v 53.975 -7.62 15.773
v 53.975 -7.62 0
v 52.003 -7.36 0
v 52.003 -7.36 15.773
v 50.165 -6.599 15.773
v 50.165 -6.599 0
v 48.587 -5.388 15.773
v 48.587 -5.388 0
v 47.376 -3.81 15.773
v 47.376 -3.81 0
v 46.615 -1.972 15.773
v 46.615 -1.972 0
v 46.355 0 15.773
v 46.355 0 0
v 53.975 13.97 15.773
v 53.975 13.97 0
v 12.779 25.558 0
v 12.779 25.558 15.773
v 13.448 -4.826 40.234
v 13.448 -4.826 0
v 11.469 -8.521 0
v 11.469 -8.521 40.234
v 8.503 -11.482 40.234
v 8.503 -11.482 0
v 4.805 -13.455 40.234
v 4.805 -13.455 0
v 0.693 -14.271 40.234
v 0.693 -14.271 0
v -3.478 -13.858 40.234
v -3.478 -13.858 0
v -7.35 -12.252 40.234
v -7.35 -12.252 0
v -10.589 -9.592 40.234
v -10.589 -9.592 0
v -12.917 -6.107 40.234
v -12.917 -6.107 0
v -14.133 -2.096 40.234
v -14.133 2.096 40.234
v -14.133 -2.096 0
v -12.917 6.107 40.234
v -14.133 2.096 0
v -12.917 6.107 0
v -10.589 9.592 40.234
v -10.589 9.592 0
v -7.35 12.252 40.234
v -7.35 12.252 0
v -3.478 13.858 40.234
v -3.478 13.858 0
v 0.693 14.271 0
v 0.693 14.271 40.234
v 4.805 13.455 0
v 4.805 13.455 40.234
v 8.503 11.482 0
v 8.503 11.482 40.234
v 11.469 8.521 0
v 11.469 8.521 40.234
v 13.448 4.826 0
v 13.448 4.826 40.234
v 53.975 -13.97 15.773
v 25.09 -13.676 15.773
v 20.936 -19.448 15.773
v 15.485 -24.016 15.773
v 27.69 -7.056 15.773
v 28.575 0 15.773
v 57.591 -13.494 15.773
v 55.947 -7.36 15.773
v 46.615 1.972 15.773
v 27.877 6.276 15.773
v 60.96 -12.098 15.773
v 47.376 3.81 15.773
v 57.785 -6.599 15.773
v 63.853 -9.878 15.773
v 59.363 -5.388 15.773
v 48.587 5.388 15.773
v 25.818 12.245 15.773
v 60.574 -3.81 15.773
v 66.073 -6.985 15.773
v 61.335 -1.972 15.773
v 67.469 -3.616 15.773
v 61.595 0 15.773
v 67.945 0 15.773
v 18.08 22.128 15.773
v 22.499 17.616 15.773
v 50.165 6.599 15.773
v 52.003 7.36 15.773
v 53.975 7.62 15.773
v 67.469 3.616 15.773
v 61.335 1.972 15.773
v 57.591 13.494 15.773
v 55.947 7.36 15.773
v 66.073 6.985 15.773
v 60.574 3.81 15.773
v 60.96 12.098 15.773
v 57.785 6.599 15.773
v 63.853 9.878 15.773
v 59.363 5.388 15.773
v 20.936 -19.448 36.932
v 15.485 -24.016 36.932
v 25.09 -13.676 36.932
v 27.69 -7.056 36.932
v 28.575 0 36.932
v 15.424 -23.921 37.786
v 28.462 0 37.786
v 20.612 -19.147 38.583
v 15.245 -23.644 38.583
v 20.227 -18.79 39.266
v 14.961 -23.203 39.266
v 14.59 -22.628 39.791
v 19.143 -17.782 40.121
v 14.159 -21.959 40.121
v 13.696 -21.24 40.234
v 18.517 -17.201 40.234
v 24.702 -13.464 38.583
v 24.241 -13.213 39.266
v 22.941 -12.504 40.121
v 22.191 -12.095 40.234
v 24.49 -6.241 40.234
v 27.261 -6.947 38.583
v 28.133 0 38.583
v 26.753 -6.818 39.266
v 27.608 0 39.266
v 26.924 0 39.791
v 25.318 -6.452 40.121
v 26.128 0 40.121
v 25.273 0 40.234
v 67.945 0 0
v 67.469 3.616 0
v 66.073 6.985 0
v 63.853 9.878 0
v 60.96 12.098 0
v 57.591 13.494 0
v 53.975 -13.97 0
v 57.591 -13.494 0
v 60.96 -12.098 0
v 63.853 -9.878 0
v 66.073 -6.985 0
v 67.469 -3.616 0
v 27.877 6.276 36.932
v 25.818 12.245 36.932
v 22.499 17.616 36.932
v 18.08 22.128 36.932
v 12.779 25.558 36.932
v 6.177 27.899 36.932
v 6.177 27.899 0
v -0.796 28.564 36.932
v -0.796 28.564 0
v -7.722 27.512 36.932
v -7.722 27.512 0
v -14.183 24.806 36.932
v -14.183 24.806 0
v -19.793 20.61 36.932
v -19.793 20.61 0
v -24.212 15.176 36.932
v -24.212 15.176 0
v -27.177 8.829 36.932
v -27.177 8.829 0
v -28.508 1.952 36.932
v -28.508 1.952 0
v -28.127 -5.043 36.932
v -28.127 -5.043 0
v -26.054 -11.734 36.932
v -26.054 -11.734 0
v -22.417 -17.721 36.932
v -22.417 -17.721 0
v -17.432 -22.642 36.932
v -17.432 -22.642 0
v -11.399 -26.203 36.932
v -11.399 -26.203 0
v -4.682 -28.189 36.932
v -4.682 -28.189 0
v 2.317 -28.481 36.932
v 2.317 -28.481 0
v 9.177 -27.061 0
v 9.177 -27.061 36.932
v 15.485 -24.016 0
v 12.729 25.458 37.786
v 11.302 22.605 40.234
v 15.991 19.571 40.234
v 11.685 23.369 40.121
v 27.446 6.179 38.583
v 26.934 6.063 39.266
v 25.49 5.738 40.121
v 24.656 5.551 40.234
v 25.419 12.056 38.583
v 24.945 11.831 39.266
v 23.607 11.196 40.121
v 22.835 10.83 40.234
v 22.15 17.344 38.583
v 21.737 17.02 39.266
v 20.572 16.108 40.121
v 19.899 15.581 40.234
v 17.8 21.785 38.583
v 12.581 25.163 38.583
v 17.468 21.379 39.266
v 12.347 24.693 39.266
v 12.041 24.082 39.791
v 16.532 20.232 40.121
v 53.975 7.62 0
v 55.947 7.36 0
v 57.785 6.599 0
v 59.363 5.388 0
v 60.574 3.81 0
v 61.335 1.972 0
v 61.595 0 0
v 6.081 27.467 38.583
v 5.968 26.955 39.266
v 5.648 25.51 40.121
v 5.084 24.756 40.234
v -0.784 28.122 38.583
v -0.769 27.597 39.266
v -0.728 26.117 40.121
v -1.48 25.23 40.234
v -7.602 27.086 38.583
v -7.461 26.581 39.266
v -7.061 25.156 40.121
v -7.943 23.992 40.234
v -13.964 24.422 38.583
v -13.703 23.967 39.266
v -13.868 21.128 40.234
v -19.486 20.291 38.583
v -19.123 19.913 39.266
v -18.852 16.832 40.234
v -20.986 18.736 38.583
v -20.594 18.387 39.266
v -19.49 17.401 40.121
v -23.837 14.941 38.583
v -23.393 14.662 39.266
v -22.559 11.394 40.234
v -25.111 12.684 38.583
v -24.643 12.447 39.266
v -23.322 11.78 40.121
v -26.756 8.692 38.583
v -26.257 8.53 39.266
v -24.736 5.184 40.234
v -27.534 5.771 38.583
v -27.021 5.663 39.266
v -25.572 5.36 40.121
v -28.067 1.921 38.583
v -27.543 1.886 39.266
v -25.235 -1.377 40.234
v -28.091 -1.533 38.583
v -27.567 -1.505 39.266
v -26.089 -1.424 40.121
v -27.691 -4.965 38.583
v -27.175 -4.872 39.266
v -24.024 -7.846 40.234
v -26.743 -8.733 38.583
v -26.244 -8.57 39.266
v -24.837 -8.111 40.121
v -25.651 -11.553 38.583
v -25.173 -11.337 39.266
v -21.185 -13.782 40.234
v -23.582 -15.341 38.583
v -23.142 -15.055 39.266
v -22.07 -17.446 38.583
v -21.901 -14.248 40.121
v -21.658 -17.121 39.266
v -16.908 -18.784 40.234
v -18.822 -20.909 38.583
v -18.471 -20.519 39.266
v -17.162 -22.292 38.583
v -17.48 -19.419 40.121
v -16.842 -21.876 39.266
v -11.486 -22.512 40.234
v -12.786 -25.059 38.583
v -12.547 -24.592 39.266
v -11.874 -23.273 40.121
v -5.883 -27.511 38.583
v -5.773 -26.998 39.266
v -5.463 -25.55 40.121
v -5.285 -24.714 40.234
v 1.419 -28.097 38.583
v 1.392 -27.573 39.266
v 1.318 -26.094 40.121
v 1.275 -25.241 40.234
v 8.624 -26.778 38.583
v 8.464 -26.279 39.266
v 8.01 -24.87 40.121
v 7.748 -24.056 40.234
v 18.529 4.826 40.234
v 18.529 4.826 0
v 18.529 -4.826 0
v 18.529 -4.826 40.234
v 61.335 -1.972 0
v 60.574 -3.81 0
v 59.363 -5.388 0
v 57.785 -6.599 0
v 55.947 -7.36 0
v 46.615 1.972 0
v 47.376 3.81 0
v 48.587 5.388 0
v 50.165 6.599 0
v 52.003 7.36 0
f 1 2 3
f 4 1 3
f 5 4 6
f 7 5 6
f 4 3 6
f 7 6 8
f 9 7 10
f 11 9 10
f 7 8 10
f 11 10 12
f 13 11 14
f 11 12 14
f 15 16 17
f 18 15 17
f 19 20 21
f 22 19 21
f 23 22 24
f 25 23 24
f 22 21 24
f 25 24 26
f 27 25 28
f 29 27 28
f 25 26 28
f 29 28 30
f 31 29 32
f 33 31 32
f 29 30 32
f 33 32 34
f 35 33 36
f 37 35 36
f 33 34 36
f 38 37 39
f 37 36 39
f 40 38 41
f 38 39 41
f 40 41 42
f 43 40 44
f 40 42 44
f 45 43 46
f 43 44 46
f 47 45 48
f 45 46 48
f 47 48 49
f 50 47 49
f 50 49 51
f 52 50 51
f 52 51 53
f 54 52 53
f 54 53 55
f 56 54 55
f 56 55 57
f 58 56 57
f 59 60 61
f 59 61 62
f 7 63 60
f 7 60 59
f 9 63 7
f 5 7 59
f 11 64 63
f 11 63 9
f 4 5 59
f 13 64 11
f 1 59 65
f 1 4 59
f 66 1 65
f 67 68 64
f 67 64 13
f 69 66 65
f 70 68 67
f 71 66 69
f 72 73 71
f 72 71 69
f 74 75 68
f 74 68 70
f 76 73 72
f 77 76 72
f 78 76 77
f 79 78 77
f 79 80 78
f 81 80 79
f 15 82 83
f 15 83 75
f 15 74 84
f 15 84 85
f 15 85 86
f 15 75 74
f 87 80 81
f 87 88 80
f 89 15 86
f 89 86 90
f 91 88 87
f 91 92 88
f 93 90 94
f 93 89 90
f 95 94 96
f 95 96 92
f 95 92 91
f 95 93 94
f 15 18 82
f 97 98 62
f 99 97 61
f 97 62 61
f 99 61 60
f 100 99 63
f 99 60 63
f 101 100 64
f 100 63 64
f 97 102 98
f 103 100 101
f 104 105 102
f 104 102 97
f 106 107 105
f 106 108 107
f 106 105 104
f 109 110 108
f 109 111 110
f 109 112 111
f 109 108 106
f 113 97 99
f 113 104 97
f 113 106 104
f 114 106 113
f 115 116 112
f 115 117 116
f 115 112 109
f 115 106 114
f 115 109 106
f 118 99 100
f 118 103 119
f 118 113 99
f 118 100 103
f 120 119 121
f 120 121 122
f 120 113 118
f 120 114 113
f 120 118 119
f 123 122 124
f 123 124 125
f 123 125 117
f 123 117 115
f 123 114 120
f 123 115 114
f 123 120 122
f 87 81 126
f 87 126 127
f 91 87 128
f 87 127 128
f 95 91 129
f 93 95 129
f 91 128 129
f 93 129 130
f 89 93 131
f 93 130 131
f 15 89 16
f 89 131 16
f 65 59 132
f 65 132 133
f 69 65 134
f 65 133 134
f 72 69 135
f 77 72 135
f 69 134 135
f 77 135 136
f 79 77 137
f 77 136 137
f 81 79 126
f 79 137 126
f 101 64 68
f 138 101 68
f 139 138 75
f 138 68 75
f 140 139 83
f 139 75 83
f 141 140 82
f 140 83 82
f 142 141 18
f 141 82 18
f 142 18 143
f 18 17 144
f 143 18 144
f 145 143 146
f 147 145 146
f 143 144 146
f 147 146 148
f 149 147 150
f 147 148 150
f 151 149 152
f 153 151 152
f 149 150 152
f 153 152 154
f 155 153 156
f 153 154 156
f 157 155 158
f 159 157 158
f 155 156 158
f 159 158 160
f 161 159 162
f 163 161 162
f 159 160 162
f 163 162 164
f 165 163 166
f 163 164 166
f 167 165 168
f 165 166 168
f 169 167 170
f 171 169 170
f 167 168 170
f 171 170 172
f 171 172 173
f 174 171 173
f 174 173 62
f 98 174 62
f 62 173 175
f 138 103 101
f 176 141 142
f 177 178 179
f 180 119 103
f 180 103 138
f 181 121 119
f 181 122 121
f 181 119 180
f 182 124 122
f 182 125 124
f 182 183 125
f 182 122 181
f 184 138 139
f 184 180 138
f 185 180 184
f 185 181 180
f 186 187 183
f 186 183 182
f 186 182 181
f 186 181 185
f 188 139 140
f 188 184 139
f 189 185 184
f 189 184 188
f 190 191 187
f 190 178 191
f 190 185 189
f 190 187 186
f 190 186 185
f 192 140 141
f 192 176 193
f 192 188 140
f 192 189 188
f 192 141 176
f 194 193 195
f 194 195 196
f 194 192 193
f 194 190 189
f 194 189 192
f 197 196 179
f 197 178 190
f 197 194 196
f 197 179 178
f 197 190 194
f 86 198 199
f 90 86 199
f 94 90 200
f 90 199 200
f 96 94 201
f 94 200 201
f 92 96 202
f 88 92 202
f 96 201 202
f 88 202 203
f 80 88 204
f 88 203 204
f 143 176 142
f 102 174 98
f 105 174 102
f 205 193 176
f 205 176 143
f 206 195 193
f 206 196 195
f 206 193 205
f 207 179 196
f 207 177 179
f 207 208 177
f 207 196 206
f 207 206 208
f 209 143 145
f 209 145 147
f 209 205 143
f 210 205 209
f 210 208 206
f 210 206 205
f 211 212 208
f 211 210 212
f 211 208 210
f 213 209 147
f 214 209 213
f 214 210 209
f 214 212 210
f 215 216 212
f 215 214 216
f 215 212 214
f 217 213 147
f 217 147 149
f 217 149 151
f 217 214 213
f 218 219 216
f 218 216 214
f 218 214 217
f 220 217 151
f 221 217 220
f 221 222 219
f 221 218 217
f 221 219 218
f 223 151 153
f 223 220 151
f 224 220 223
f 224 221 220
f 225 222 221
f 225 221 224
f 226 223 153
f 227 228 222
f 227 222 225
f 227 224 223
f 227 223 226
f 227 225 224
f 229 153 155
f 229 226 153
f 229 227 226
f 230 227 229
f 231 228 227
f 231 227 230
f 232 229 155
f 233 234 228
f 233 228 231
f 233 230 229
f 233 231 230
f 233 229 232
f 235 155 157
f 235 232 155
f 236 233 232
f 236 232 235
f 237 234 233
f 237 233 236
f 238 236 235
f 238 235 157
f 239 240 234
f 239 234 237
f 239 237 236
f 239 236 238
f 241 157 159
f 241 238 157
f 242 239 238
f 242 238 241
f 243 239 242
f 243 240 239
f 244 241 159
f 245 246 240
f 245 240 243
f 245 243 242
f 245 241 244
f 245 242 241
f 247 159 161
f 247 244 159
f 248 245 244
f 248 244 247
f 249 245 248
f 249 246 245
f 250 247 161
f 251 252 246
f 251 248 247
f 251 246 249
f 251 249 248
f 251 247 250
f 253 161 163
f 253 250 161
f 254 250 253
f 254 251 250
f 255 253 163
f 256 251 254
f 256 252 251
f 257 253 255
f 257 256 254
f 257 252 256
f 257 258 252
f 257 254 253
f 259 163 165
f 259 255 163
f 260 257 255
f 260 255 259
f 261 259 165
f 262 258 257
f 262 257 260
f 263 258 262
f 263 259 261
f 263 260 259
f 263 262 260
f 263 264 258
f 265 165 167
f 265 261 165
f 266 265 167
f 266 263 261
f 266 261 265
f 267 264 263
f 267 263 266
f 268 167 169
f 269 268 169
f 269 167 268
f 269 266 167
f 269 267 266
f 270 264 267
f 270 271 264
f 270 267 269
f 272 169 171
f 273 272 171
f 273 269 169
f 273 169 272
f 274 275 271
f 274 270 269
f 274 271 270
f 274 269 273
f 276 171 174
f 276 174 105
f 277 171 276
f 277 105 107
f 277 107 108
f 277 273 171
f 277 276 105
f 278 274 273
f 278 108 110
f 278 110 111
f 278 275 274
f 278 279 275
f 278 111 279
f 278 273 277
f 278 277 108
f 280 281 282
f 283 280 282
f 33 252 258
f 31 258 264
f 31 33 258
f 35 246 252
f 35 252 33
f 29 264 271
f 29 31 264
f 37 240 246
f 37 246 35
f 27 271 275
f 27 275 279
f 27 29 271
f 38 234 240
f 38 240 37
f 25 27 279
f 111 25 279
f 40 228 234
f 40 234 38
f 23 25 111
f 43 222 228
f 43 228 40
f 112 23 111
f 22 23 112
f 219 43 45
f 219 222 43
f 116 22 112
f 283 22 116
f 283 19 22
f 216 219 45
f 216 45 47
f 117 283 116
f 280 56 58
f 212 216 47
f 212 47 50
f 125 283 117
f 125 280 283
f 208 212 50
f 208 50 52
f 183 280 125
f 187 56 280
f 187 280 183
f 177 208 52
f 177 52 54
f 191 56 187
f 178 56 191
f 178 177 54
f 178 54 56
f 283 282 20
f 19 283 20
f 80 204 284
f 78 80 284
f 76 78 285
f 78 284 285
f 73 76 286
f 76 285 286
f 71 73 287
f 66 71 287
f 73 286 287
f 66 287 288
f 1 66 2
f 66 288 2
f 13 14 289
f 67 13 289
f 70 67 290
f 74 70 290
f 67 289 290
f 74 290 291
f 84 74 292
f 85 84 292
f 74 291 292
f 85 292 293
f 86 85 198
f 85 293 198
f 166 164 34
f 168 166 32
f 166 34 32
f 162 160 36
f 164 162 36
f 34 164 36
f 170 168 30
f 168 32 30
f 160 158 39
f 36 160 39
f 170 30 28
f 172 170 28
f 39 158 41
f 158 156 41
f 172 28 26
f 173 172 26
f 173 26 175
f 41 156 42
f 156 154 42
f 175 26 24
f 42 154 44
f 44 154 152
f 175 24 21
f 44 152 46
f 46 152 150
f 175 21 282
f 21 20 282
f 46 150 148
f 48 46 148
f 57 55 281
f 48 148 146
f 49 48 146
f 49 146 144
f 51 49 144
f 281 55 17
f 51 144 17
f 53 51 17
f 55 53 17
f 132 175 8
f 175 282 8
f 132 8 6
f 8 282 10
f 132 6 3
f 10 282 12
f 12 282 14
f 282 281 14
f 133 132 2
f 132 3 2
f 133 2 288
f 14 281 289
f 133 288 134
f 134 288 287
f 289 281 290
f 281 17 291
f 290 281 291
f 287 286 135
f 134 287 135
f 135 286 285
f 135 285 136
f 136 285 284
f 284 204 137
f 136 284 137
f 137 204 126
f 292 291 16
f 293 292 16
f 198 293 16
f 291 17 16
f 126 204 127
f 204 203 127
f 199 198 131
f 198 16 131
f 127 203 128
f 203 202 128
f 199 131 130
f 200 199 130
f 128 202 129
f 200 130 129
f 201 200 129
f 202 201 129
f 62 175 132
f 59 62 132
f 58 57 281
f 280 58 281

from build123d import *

# Parameters (mm, degrees)
F1_DEPTH = 40.2336
F2_DEPTH = 15.7734
F3_R     = 3.302


with BuildPart() as f1:
    # F0 (on Top) → F1 (new body)
    with BuildSketch(Plane.XY):
        with BuildLine():
            ThreePointArc((15.4849246273, -24.0155727453), (25.0899616005, -13.6756883515), (28.575, 0))
            ThreePointArc((28.575, 0), (24.3073468487, 15.0227665288), (12.7791284914, 25.5582569828))
            ThreePointArc((12.7791284914, 25.5582569828), (-28.532530963, -1.5573380643), (15.4849246273, -24.0155727453))
        make_face()
        with BuildLine():
            Line((18.5293, 4.826), (18.5293, 0))
            Line((18.5293, 0), (18.5293, -4.826))
            Line((18.5293, -4.826), (13.4477648793, -4.826))
            ThreePointArc((13.4477648793, -4.826), (-14.2875, 0), (13.4477648793, 4.826))
            Line((13.4477648793, 4.826), (18.5293, 4.826))
        make_face(mode=Mode.SUBTRACT)
    extrude(amount=F1_DEPTH)

    # F0 (on Top) → F2 (join)
    with BuildSketch(Plane.XY):
        with BuildLine():
            ThreePointArc((12.7791284914, 25.5582569828), (24.3073468487, 15.0227665288), (28.575, 0))
            Line((28.575, 0), (40.005, 0))
            ThreePointArc((40.005, 0), (44.0967182668, 9.8782817332), (53.975, 13.97))
            Line((53.975, 13.97), (12.7791284914, 25.5582569828))
        make_face()
        with BuildLine():
            Line((40.005, 0), (28.575, 0))
            ThreePointArc((28.575, 0), (25.0899616005, -13.6756883515), (15.4849246273, -24.0155727453))
            Line((15.4849246273, -24.0155727453), (53.975, -13.97))
            ThreePointArc((53.975, -13.97), (44.0967182668, -9.8782817332), (40.005, 0))
        make_face()
        with BuildLine():
            Line((46.355, 0), (40.005, 0))
            ThreePointArc((40.005, 0), (44.0967182668, -9.8782817332), (53.975, -13.97))
            Line((53.975, -13.97), (53.975, -7.62))
            ThreePointArc((53.975, -7.62), (48.5868463274, -5.3881536726), (46.355, 0))
        make_face()
        with BuildLine():
            ThreePointArc((53.975, 13.97), (44.0967182668, 9.8782817332), (40.005, 0))
            Line((40.005, 0), (46.355, 0))
            ThreePointArc((46.355, 0), (48.5868463274, 5.3881536726), (53.975, 7.62))
            Line((53.975, 7.62), (53.975, 13.97))
        make_face()
        with BuildLine():
            ThreePointArc((67.945, 0), (63.8532817332, 9.8782817332), (53.975, 13.97))
            Line((53.975, 13.97), (53.975, 7.62))
            ThreePointArc((53.975, 7.62), (59.3631536726, 5.3881536726), (61.595, 0))
            ThreePointArc((61.595, 0), (59.3631536726, -5.3881536726), (53.975, -7.62))
            Line((53.975, -7.62), (53.975, -13.97))
            ThreePointArc((53.975, -13.97), (63.8532817332, -9.8782817332), (67.945, 0))
        make_face()
    extrude(amount=F2_DEPTH)

    # F3
    f3_edges = [f1.edges().sort_by_distance(p)[0] for p in [
        (-15.484925, 24.015573, 40.2336),
    ]]
    fillet(f3_edges, radius=F3_R)


solid = f1.part
